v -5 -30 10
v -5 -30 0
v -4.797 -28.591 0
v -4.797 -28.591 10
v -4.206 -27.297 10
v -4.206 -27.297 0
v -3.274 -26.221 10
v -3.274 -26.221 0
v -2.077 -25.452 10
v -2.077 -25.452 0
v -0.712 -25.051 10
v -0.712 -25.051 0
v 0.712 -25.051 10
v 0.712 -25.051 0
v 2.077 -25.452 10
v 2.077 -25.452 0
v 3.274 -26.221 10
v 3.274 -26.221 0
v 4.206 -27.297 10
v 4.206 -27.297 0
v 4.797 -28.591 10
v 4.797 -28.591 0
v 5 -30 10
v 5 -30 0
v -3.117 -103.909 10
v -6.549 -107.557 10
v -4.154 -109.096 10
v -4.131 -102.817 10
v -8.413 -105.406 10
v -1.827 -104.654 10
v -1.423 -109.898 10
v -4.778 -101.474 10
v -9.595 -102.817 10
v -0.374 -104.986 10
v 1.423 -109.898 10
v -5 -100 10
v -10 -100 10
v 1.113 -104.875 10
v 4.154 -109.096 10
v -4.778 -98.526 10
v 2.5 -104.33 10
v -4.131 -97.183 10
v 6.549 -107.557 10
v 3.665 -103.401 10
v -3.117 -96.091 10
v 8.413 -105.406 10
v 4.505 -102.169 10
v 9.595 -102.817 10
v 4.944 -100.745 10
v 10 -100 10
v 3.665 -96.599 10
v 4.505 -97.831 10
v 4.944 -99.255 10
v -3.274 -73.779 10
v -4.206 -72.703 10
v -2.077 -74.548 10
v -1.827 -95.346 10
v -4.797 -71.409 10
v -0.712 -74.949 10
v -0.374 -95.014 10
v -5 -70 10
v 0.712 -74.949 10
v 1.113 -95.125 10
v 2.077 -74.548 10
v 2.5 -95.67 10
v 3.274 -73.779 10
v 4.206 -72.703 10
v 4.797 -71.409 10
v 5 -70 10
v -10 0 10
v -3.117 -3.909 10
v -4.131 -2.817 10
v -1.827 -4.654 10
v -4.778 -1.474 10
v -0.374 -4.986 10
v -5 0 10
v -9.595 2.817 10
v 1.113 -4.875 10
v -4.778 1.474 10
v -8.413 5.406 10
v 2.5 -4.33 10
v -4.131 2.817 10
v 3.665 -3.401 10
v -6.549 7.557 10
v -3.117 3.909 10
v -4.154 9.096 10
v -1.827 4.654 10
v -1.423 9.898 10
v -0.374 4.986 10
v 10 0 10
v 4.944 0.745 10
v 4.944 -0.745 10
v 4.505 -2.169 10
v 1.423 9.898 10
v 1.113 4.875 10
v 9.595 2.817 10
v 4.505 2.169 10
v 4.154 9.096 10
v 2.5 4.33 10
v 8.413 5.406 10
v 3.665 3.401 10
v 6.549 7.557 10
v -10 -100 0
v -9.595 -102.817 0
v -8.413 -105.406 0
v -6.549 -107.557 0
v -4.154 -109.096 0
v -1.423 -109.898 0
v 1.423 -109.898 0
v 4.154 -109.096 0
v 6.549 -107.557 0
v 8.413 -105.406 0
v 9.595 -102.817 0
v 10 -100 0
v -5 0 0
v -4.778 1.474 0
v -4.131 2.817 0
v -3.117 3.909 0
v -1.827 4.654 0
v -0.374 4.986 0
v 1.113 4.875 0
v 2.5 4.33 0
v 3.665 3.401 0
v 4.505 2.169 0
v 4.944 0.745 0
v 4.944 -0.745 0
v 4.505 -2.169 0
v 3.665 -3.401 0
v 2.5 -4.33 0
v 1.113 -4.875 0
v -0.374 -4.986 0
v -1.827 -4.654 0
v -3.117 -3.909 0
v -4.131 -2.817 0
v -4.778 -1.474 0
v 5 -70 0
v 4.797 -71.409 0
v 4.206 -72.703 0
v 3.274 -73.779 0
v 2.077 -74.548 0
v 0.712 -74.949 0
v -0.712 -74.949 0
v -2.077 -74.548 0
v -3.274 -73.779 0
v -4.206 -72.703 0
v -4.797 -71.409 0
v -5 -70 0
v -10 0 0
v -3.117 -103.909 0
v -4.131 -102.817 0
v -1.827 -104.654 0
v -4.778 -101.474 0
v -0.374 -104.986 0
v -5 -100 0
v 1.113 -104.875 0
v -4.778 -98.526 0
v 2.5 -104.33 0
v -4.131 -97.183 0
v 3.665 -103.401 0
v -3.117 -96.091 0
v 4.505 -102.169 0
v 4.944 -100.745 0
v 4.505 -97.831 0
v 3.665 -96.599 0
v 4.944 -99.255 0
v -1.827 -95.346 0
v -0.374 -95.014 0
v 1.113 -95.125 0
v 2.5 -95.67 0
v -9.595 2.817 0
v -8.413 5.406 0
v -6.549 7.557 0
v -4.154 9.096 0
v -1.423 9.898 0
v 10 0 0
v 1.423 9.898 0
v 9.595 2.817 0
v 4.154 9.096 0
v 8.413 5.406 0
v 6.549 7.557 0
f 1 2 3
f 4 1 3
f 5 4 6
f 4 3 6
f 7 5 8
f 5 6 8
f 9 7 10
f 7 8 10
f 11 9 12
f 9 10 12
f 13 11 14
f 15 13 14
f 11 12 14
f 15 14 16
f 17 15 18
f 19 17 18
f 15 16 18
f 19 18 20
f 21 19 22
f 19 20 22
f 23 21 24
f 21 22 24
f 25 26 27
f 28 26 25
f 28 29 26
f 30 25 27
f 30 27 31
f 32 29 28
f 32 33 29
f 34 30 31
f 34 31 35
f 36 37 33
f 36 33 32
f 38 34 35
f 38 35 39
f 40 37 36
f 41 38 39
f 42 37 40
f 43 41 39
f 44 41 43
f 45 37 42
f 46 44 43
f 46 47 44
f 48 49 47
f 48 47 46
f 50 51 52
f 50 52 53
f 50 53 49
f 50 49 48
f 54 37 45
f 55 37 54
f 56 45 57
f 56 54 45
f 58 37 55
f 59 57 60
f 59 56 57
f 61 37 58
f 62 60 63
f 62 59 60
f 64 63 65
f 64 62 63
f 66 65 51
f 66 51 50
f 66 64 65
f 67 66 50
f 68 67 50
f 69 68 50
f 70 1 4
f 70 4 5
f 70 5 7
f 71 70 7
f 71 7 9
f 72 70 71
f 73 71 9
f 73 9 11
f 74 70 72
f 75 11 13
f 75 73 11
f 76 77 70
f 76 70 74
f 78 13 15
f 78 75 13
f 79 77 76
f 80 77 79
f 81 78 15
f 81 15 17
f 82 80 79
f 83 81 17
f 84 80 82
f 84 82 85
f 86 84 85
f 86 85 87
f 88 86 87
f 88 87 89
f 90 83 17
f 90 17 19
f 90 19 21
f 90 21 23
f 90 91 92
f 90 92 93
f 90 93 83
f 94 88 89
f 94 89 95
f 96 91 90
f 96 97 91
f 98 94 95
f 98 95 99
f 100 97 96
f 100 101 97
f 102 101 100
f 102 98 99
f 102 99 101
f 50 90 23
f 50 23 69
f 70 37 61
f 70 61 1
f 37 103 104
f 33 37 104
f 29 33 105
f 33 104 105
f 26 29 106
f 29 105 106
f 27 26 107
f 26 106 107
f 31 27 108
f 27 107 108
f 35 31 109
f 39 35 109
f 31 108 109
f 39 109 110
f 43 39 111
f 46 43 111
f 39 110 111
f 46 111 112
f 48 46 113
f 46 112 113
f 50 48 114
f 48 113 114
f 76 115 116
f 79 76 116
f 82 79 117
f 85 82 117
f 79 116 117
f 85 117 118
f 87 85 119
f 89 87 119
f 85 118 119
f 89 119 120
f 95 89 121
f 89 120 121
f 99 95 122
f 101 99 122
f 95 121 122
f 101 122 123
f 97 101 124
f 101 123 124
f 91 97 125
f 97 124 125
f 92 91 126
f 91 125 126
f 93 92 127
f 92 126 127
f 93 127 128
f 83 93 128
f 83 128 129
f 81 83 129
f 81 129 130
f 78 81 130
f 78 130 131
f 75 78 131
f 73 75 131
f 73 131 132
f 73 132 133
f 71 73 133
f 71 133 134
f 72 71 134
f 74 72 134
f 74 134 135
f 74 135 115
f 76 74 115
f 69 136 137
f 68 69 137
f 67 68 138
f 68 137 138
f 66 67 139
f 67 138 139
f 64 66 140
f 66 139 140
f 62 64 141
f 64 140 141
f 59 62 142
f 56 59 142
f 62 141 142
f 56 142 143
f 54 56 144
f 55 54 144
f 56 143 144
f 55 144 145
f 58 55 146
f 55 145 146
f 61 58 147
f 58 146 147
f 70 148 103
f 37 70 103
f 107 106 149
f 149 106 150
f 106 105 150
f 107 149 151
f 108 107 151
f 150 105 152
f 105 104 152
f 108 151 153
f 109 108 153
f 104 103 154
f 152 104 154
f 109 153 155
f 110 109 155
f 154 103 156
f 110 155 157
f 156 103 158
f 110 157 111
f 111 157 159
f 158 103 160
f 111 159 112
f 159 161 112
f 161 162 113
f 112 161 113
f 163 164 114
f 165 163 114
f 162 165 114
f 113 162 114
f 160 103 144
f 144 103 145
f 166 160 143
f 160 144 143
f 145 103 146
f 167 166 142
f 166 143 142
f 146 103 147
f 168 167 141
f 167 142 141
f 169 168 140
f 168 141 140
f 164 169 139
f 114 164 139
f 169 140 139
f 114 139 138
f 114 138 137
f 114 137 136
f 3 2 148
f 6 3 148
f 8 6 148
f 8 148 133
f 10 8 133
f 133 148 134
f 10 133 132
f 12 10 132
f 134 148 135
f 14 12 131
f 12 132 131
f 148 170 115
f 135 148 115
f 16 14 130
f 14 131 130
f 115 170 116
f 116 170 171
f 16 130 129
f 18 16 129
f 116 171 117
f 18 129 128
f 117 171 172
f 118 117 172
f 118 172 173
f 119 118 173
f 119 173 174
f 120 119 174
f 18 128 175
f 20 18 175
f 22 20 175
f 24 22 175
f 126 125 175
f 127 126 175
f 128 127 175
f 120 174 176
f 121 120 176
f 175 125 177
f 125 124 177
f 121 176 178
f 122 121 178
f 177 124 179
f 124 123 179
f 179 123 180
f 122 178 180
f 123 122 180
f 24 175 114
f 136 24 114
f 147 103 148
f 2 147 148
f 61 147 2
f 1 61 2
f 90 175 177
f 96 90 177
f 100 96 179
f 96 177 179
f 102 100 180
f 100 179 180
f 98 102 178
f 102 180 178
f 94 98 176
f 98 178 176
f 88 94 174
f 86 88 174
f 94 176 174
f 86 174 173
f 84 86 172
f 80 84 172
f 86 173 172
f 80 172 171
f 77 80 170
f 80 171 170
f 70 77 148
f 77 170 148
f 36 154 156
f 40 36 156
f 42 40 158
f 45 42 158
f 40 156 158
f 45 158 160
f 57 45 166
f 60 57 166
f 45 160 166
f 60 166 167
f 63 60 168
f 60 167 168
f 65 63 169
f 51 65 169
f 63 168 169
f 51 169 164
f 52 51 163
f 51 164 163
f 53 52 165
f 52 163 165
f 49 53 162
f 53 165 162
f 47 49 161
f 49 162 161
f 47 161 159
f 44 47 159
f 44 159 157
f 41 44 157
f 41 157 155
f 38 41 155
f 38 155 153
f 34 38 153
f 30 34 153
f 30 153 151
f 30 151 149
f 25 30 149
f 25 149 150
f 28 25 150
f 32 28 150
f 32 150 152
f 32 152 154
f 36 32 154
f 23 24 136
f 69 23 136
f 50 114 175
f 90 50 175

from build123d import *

# Parameters (mm, degrees)
F1_DEPTH = 10
F3_D     = 10


with BuildPart() as f1:
    # F0 (on Top) → F1 (new body)
    with BuildSketch(Plane.XY):
        with BuildLine():
            Line((10, -100), (10, 0))
            ThreePointArc((10, 0), (0, 10), (-10, 0))
            Line((-10, 0), (-10, -100))
            ThreePointArc((-10, -100), (0, -110), (10, -100))
        make_face()
        with BuildLine():
            ThreePointArc((-5, -30), (0, -25), (5, -30))
            Line((5, -30), (5, -70))
            ThreePointArc((5, -70), (0, -75), (-5, -70))
            Line((-5, -70), (-5, -30))
        make_face(mode=Mode.SUBTRACT)
    extrude(amount=F1_DEPTH)

    # F3 (through all)
    with Locations(Plane.XY.offset(10)):
        with Locations((0, 0), (0, -100)):
            Hole(F3_D / 2)


solid = f1.part
